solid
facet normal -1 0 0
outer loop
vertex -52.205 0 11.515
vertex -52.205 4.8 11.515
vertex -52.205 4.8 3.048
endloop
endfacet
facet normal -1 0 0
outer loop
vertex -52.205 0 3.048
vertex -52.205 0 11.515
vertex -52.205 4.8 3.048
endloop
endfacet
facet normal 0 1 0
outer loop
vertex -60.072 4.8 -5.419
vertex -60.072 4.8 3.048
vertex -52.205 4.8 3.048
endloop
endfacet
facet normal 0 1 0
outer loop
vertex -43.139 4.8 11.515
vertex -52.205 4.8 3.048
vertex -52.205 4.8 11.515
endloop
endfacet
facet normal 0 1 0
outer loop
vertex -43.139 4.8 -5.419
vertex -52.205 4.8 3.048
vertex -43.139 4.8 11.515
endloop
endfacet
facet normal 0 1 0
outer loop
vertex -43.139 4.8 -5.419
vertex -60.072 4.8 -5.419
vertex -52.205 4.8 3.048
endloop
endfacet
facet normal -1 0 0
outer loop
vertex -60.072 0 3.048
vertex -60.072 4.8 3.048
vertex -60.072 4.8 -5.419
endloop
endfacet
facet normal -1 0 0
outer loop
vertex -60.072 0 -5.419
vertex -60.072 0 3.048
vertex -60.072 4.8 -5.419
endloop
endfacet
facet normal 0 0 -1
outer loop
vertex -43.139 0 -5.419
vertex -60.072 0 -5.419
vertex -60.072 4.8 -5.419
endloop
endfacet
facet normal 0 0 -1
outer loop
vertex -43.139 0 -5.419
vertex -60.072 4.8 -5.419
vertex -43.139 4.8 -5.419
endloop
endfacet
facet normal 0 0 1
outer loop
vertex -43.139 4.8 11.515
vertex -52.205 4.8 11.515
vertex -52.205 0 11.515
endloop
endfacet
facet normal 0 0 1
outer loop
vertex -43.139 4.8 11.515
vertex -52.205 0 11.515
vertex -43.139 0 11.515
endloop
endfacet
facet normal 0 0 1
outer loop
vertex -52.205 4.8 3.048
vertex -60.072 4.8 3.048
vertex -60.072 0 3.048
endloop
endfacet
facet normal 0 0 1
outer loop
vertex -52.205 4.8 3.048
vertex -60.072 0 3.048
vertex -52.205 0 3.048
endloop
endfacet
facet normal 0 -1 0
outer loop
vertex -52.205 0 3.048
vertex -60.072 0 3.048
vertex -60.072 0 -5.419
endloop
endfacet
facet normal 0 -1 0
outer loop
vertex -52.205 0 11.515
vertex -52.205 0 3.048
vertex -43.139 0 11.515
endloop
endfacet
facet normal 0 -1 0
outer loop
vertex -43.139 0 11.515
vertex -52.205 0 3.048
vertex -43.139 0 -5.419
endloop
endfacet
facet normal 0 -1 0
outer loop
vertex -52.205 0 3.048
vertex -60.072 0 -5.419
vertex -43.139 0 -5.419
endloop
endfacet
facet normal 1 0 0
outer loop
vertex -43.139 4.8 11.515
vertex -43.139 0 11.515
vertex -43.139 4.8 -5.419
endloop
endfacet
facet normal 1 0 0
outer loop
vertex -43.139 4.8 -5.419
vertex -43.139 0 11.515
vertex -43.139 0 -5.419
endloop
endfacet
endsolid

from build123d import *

# Parameters (mm, degrees)
SKETCH1_W           = 45.956077194
SKETCH1_H           = 60.759300765
BOSS_EXTRUDE1_DEPTH = 4.800000052
SKETCH2_W           = 36.889410711
SKETCH2_H           = 52.292642565
CUT_EXTRUDE1_DEPTH  = 105.99289819
SKETCH3_W           = 9.066666483
SKETCH3_H           = 43.825967432
CUT_EXTRUDE3_DEPTH  = 105.99289819
SKETCH4_W           = 29.02274386
SKETCH4_H           = 8.4666582
CUT_EXTRUDE4_DEPTH  = 90.963914511


with BuildPart() as part:
    # Sketch1 → Boss-Extrude1 (new body)
    with BuildSketch(Plane(origin=(0, 0, 0), x_dir=(1, 0, 0), z_dir=(0, 1, 0))):
        with Locations((-66.116726553, -24.961035308)):
            Rectangle(SKETCH1_W, SKETCH1_H)
    extrude(amount=BOSS_EXTRUDE1_DEPTH)

    # Sketch2 → Cut-Extrude1 (cut, through all)
    with BuildSketch(Plane(origin=(0, 4.800000052, 0), x_dir=(1, 0, 0), z_dir=(0, 1, 0))):
        with Locations((-70.650059795, -29.194364408)):
            Rectangle(SKETCH2_W, SKETCH2_H)
    extrude(amount=-CUT_EXTRUDE1_DEPTH, mode=Mode.SUBTRACT)

    # Sketch3 → Cut-Extrude3 (cut, through all)
    with BuildSketch(Plane(origin=(0, 4.800000052, 0), x_dir=(1, 0, 0), z_dir=(0, 1, 0))):
        with Locations((-47.672021198, -33.427701974)):
            Rectangle(SKETCH3_W, SKETCH3_H)
    extrude(amount=-CUT_EXTRUDE3_DEPTH, mode=Mode.SUBTRACT)

    # Sketch4 → Cut-Extrude4 (cut, through all)
    with BuildSketch(Plane(origin=(0, 4.800000052, 0), x_dir=(1, 0, 0), z_dir=(0, 1, 0))):
        with Locations((-74.58339322, 1.185285975)):
            Rectangle(SKETCH4_W, SKETCH4_H)
    extrude(amount=-CUT_EXTRUDE4_DEPTH, mode=Mode.SUBTRACT)


solid = part.part
